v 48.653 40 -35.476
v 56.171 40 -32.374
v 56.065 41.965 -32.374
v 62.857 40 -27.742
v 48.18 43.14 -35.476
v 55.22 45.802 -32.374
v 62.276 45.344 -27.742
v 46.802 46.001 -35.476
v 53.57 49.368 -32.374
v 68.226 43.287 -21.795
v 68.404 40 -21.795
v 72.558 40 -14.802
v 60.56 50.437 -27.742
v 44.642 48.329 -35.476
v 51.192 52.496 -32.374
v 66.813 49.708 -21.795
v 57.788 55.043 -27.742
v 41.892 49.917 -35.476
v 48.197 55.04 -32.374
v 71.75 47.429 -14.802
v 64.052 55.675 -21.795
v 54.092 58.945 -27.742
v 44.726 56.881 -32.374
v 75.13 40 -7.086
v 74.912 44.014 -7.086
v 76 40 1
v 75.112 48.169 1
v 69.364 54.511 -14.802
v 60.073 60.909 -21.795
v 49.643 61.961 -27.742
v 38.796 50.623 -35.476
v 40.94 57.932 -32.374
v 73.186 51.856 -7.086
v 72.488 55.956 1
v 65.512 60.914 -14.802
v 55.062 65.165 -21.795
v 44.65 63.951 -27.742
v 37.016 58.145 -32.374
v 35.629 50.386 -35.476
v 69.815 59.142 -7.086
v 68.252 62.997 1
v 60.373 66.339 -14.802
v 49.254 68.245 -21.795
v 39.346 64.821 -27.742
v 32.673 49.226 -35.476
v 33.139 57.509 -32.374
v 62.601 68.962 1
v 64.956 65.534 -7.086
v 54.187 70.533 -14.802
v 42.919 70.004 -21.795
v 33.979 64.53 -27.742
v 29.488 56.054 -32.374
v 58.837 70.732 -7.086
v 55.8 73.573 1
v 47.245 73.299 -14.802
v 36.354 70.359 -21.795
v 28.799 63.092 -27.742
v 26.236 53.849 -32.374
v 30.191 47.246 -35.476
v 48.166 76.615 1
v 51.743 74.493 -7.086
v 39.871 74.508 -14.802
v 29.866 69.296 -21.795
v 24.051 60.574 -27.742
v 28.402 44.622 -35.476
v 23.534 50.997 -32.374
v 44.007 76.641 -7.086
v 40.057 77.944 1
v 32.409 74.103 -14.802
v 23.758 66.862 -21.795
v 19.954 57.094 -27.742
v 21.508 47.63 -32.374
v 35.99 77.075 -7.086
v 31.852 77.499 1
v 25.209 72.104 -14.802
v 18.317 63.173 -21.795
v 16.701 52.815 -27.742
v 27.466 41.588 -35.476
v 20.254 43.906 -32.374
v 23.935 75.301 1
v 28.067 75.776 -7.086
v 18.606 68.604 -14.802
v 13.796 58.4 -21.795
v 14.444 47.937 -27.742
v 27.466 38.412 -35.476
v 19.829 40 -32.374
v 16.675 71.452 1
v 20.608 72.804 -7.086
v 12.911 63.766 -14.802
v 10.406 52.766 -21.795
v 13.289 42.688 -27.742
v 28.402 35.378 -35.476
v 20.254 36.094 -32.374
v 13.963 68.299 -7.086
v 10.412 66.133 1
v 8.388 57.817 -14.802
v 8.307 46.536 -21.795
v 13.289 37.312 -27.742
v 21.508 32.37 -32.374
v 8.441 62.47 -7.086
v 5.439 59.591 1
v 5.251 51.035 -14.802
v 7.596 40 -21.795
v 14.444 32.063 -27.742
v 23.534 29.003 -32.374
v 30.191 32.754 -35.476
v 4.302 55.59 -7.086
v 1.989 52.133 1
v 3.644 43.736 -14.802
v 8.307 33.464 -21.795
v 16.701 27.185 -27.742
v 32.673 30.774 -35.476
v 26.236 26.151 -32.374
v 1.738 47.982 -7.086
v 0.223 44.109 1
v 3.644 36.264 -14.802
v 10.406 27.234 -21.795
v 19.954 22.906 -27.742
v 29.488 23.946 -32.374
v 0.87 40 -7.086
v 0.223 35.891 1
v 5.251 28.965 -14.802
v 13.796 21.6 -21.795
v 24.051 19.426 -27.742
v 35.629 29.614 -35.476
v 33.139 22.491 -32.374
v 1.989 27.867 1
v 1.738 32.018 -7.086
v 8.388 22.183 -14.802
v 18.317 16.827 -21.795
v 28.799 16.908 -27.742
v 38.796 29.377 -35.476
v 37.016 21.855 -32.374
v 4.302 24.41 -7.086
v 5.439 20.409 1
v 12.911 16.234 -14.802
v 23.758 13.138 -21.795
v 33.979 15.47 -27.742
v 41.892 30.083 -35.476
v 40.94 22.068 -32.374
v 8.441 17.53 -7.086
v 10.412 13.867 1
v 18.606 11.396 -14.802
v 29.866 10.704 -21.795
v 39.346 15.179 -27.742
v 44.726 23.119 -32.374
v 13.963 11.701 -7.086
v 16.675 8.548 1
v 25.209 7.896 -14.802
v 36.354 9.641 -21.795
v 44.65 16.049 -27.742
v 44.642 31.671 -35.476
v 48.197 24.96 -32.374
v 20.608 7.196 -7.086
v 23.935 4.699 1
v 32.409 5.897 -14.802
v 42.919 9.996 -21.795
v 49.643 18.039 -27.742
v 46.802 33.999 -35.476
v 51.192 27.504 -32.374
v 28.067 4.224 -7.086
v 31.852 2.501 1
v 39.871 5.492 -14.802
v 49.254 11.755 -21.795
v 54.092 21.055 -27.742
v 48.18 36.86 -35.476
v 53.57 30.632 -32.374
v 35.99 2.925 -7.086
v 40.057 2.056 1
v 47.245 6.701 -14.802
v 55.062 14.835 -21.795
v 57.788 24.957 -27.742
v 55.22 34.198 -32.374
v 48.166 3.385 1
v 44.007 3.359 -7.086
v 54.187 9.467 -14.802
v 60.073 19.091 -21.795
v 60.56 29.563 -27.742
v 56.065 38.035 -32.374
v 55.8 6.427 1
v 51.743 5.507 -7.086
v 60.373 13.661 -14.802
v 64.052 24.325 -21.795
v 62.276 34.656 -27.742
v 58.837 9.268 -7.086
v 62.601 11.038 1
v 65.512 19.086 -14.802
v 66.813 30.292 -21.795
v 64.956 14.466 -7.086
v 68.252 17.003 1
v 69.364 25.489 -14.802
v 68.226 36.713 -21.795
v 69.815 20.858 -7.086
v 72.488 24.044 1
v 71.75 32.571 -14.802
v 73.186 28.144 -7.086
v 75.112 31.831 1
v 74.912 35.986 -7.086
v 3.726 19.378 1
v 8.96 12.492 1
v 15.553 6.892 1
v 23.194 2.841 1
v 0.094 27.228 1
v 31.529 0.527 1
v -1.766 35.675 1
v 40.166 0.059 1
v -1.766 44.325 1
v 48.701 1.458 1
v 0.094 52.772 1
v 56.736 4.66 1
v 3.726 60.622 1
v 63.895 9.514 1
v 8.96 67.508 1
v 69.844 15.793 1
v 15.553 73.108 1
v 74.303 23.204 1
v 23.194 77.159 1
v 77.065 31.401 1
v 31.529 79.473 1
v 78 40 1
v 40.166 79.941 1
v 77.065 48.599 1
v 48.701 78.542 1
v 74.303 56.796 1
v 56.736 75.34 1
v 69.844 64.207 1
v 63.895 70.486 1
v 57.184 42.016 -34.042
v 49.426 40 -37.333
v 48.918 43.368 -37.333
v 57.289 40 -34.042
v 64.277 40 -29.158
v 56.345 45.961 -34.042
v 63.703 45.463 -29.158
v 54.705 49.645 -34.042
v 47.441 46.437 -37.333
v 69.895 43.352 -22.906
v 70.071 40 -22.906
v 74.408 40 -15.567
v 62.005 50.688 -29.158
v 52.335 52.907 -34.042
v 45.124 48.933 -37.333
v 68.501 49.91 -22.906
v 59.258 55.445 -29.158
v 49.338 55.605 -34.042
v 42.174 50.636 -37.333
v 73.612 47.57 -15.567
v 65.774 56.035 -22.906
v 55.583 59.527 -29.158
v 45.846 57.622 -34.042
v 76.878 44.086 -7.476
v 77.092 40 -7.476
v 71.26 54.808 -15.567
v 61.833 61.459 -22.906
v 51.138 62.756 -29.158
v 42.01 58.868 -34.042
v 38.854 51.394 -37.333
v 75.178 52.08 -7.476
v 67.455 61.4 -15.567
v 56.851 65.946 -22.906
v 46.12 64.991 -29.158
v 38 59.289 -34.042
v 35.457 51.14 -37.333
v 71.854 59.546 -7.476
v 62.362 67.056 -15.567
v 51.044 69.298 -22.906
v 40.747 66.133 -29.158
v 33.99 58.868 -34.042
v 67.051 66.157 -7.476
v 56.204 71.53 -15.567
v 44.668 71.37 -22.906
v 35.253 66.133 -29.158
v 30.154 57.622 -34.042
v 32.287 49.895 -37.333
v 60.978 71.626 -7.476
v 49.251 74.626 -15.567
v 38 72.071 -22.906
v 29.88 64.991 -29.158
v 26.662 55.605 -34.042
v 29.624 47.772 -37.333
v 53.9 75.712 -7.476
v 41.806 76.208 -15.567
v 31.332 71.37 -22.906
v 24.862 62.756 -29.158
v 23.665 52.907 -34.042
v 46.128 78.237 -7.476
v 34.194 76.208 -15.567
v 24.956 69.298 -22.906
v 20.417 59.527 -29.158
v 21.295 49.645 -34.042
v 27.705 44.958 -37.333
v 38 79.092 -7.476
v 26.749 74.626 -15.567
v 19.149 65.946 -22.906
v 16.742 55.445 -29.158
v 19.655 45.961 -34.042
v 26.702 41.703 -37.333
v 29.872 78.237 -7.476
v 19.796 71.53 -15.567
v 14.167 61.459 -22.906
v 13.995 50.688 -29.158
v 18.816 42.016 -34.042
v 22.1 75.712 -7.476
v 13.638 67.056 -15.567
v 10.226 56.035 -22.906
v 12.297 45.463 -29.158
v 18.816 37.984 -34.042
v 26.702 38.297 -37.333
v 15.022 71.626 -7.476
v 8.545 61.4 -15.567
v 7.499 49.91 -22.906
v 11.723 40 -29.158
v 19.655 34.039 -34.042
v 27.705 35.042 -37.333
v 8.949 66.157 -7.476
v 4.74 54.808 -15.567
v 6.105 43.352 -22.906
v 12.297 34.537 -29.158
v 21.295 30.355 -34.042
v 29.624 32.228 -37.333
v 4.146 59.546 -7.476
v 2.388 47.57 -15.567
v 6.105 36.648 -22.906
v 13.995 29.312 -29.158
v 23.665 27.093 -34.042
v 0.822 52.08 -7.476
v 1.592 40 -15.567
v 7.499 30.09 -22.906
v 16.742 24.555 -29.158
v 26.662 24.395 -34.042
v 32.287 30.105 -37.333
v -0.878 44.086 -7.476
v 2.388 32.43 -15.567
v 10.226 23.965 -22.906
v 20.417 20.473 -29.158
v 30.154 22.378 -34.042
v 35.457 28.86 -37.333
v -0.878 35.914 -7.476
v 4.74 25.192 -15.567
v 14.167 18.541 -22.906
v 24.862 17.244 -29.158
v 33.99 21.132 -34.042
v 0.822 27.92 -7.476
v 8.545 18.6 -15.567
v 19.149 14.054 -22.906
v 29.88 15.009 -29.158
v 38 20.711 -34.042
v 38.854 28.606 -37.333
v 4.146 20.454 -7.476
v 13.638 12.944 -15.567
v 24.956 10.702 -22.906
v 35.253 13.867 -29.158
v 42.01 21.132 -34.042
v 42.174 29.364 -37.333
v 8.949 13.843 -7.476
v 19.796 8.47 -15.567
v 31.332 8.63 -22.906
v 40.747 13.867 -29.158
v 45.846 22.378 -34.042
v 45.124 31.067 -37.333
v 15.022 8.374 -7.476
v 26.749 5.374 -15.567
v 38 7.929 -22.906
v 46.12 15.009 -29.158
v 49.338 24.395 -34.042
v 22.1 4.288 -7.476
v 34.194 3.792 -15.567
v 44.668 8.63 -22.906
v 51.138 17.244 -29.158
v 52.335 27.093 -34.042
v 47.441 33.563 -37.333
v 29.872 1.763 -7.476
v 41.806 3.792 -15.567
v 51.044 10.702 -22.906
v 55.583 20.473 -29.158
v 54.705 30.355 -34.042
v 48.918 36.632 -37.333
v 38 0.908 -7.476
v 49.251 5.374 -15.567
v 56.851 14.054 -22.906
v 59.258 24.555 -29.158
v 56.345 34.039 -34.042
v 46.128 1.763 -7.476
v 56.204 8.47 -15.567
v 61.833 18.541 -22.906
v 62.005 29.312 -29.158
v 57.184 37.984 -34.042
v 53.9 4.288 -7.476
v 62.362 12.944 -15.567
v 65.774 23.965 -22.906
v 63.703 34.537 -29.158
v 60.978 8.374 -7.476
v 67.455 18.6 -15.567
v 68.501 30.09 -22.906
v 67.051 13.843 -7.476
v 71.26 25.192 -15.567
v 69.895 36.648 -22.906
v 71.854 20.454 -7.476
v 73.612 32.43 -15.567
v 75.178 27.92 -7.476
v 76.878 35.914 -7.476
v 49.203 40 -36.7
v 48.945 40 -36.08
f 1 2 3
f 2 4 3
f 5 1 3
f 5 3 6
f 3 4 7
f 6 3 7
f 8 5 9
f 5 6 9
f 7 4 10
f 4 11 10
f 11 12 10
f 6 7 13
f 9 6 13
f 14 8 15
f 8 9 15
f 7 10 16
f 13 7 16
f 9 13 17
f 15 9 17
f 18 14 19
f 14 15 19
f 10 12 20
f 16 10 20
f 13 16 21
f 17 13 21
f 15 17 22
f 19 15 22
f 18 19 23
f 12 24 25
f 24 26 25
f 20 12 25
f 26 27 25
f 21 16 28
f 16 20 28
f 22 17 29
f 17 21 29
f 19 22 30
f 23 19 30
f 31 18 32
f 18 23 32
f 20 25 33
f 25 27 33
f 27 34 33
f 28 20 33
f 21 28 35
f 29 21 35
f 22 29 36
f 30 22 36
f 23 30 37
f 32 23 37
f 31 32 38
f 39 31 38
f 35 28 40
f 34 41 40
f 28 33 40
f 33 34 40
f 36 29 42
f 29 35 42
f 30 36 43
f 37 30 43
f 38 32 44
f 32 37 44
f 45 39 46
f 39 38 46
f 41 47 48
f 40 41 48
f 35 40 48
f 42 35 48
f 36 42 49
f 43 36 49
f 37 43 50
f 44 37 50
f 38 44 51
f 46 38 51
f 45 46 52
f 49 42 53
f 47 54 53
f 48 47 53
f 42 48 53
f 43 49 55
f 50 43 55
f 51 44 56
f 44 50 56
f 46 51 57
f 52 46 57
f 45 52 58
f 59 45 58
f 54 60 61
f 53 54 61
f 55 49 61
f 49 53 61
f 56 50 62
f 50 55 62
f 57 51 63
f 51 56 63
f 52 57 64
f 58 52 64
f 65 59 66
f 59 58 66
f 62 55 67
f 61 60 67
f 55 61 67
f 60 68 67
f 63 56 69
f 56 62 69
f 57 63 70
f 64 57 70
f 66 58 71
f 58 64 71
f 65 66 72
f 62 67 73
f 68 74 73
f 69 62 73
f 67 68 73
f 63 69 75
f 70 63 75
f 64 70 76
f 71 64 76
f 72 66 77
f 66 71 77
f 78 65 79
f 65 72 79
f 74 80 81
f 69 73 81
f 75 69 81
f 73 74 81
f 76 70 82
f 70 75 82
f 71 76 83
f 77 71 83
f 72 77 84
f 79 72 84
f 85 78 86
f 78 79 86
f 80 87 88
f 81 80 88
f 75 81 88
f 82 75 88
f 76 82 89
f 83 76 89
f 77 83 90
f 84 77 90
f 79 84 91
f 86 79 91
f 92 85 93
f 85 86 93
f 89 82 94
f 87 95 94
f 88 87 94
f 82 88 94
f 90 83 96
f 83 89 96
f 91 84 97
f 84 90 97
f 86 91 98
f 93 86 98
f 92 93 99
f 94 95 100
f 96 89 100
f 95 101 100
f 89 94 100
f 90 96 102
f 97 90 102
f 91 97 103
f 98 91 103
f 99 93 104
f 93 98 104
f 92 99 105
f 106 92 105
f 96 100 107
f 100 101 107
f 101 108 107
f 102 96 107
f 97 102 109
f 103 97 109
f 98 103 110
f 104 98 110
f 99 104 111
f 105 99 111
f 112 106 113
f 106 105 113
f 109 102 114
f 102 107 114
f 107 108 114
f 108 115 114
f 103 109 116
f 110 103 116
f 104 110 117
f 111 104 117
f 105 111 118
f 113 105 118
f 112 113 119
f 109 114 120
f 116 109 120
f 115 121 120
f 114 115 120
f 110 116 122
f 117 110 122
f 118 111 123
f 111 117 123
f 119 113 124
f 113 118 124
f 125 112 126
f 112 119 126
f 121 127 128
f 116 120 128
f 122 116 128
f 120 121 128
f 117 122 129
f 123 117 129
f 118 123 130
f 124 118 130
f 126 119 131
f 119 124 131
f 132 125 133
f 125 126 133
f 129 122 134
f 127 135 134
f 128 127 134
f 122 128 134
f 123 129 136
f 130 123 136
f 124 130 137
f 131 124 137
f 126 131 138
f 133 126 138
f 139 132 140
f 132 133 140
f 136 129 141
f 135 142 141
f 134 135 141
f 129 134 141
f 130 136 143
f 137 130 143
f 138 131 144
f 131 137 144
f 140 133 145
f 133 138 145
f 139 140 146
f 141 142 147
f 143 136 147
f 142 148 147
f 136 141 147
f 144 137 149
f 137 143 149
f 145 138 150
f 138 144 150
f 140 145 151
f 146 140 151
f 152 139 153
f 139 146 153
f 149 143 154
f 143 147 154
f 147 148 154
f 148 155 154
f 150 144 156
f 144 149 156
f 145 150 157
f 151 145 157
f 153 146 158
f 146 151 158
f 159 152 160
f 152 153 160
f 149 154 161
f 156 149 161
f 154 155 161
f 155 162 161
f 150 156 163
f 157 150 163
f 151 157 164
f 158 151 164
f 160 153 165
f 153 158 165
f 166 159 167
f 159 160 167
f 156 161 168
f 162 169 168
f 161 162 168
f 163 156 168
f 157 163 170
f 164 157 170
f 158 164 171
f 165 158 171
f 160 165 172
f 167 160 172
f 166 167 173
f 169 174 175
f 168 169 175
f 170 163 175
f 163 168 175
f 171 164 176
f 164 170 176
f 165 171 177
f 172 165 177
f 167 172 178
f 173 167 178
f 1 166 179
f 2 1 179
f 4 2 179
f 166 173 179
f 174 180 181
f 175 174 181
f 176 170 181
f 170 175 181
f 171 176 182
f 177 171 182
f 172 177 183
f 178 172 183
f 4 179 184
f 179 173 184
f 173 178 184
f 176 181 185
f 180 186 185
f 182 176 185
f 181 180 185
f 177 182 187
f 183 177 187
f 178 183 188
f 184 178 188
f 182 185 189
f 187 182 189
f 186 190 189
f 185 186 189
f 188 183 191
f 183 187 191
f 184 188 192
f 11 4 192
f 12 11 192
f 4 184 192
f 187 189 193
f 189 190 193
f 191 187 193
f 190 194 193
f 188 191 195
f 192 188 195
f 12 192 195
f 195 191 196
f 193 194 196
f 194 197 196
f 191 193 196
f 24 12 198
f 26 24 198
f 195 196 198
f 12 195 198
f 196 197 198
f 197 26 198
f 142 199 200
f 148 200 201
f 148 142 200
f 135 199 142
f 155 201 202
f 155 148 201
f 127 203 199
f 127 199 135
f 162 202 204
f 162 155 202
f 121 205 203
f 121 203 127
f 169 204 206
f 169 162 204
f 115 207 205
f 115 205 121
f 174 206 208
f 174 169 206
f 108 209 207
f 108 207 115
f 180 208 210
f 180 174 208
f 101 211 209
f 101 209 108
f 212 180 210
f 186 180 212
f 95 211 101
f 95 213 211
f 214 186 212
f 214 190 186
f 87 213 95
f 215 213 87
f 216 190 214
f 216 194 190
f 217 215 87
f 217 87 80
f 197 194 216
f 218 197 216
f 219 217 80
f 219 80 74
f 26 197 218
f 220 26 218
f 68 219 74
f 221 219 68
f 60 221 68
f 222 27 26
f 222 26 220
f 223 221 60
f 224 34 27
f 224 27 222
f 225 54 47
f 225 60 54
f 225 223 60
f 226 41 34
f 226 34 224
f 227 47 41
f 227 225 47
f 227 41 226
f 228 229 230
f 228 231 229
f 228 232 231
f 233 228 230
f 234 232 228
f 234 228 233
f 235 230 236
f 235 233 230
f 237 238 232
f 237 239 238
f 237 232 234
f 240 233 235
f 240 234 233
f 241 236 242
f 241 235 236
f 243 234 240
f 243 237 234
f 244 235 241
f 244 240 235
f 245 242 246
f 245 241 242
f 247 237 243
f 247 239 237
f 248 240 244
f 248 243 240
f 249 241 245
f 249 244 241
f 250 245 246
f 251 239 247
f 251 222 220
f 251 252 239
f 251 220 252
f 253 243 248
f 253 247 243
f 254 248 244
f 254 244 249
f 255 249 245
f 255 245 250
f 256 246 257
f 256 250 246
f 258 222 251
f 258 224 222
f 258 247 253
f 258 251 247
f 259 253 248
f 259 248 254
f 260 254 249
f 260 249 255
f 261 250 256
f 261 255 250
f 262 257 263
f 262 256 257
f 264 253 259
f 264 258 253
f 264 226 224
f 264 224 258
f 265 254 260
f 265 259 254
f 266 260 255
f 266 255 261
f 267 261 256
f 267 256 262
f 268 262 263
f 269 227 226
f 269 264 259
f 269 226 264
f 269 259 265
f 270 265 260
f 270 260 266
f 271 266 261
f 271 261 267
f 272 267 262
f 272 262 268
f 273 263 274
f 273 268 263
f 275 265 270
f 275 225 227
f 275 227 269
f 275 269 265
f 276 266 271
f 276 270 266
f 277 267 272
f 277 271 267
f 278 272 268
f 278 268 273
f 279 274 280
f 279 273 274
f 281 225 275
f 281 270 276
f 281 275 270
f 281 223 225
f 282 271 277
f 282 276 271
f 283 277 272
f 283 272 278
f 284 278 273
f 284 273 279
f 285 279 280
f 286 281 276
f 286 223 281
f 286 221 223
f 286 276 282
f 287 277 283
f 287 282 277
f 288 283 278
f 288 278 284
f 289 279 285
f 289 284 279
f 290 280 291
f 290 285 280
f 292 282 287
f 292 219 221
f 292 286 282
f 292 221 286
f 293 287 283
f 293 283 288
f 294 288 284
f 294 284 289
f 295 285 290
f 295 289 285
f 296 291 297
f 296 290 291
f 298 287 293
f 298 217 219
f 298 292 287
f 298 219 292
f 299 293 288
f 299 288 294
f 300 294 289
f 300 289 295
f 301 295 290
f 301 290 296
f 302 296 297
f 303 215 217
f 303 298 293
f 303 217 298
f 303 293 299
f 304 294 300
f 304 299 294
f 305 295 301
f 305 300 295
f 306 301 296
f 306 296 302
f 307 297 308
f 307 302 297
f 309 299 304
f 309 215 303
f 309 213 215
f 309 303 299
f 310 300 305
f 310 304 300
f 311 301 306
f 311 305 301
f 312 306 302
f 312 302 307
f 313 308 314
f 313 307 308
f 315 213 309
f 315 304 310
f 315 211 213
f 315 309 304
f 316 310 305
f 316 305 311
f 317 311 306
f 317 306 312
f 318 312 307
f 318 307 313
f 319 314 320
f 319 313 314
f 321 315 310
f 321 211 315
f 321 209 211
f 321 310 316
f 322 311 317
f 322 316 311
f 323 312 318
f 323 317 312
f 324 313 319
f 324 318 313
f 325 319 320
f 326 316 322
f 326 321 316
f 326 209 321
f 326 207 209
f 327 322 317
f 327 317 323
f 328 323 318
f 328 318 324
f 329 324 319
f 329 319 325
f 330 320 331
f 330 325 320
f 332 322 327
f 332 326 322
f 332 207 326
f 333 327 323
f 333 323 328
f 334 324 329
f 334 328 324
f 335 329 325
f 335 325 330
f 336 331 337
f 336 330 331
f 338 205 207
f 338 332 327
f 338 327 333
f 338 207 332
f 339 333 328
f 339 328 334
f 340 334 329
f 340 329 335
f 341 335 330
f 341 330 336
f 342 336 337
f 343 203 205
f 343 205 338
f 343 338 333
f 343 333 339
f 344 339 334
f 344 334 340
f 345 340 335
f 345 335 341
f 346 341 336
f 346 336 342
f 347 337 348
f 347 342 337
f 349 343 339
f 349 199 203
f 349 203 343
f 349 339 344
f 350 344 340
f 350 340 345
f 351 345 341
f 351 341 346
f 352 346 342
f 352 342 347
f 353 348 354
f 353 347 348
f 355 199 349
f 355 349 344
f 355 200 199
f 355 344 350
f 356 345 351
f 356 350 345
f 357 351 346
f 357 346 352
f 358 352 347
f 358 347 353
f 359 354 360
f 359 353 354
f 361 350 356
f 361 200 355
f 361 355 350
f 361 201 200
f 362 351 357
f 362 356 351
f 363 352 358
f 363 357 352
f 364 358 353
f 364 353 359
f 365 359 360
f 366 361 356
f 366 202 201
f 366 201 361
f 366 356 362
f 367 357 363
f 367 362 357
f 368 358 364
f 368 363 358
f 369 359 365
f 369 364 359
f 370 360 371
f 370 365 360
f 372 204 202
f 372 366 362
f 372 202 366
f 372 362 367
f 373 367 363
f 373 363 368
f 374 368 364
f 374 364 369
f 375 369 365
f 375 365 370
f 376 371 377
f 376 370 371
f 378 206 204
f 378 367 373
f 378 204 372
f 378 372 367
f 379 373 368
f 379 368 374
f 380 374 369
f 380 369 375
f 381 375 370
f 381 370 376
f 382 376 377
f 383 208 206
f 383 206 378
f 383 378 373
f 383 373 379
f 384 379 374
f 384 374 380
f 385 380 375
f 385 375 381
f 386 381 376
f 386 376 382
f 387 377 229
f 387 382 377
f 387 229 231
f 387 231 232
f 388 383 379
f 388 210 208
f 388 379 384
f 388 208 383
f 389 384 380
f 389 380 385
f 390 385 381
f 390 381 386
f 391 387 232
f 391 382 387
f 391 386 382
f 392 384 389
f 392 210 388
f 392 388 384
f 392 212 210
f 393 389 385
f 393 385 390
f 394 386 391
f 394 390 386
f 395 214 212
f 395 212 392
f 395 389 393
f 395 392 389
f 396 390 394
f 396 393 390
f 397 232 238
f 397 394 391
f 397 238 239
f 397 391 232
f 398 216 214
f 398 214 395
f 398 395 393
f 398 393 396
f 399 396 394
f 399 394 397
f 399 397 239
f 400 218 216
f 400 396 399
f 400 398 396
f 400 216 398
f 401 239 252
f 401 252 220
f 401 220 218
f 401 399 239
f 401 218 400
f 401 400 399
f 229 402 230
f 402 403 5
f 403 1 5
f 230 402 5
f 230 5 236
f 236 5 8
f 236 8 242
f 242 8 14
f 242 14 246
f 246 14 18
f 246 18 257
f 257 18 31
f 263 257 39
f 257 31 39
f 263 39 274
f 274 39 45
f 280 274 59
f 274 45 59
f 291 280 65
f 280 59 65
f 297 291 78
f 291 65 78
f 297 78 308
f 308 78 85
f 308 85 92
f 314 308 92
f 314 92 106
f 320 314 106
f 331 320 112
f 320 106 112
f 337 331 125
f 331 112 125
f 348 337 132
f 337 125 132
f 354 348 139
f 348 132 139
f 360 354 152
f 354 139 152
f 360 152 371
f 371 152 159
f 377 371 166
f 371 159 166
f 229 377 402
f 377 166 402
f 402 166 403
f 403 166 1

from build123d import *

# Parameters (mm, degrees)
BOX001_W     = 80
BOX001_H     = 80
BOX001_DEPTH = 40


with BuildPart() as domepunch:
    # Sphere → Sphere (revolve)
    with BuildSketch(Plane(origin=(38, 38, 0), x_dir=(1, 0, 0), z_dir=(0, -1, 0))):
        with BuildLine():
            ThreePointArc((0, -38), (38, 0), (0, 38))
            Line((0, 38), (0, -38))
        make_face()
    revolve(axis=Axis((38, 38, 0), (0, 0, 1)))


with BuildPart() as domeslice:
    # Box001 → Box001 (new body)
    with BuildSketch(Plane(origin=(-2, -2, 0), x_dir=(1, 0, 0), z_dir=(0, 0, 1))):
        with Locations((40, 40)):
            Rectangle(BOX001_W, BOX001_H)
    extrude(amount=BOX001_DEPTH)


with BuildPart() as fusion003:
    # Sphere002 → Sphere002 (revolve)
    with BuildSketch(Plane(origin=(38, 38, -42), x_dir=(1, 0, 0), z_dir=(0, -1, 0))):
        with BuildLine():
            ThreePointArc((0, -12), (12, 0), (0, 12))
            Line((0, 12), (0, -12))
        make_face()
    revolve(axis=Axis((38, 38, -42), (0, 0, 1)))

    # Fusion003: union DomePunch, DomeSlice
    add(domepunch.part)
    add(domeslice.part)


with BuildPart() as dome:
    # Sphere001 → Sphere001 (revolve)
    with BuildSketch(Plane(origin=(38, 38, 0), x_dir=(1, 0, 0), z_dir=(0, -1, 0))):
        with BuildLine():
            ThreePointArc((0, -40), (40, 0), (0, 40))
            Line((0, 40), (0, -40))
        make_face()
    revolve(axis=Axis((38, 38, 0), (0, 0, 1)))

    # Cut: cut Fusion003
    add(fusion003.part, mode=Mode.SUBTRACT)


with BuildPart() as dome_1:
    # Cut placement: moved
    add(dome.part.moved(Location((0, 2, 1))))


solid = dome_1.part
